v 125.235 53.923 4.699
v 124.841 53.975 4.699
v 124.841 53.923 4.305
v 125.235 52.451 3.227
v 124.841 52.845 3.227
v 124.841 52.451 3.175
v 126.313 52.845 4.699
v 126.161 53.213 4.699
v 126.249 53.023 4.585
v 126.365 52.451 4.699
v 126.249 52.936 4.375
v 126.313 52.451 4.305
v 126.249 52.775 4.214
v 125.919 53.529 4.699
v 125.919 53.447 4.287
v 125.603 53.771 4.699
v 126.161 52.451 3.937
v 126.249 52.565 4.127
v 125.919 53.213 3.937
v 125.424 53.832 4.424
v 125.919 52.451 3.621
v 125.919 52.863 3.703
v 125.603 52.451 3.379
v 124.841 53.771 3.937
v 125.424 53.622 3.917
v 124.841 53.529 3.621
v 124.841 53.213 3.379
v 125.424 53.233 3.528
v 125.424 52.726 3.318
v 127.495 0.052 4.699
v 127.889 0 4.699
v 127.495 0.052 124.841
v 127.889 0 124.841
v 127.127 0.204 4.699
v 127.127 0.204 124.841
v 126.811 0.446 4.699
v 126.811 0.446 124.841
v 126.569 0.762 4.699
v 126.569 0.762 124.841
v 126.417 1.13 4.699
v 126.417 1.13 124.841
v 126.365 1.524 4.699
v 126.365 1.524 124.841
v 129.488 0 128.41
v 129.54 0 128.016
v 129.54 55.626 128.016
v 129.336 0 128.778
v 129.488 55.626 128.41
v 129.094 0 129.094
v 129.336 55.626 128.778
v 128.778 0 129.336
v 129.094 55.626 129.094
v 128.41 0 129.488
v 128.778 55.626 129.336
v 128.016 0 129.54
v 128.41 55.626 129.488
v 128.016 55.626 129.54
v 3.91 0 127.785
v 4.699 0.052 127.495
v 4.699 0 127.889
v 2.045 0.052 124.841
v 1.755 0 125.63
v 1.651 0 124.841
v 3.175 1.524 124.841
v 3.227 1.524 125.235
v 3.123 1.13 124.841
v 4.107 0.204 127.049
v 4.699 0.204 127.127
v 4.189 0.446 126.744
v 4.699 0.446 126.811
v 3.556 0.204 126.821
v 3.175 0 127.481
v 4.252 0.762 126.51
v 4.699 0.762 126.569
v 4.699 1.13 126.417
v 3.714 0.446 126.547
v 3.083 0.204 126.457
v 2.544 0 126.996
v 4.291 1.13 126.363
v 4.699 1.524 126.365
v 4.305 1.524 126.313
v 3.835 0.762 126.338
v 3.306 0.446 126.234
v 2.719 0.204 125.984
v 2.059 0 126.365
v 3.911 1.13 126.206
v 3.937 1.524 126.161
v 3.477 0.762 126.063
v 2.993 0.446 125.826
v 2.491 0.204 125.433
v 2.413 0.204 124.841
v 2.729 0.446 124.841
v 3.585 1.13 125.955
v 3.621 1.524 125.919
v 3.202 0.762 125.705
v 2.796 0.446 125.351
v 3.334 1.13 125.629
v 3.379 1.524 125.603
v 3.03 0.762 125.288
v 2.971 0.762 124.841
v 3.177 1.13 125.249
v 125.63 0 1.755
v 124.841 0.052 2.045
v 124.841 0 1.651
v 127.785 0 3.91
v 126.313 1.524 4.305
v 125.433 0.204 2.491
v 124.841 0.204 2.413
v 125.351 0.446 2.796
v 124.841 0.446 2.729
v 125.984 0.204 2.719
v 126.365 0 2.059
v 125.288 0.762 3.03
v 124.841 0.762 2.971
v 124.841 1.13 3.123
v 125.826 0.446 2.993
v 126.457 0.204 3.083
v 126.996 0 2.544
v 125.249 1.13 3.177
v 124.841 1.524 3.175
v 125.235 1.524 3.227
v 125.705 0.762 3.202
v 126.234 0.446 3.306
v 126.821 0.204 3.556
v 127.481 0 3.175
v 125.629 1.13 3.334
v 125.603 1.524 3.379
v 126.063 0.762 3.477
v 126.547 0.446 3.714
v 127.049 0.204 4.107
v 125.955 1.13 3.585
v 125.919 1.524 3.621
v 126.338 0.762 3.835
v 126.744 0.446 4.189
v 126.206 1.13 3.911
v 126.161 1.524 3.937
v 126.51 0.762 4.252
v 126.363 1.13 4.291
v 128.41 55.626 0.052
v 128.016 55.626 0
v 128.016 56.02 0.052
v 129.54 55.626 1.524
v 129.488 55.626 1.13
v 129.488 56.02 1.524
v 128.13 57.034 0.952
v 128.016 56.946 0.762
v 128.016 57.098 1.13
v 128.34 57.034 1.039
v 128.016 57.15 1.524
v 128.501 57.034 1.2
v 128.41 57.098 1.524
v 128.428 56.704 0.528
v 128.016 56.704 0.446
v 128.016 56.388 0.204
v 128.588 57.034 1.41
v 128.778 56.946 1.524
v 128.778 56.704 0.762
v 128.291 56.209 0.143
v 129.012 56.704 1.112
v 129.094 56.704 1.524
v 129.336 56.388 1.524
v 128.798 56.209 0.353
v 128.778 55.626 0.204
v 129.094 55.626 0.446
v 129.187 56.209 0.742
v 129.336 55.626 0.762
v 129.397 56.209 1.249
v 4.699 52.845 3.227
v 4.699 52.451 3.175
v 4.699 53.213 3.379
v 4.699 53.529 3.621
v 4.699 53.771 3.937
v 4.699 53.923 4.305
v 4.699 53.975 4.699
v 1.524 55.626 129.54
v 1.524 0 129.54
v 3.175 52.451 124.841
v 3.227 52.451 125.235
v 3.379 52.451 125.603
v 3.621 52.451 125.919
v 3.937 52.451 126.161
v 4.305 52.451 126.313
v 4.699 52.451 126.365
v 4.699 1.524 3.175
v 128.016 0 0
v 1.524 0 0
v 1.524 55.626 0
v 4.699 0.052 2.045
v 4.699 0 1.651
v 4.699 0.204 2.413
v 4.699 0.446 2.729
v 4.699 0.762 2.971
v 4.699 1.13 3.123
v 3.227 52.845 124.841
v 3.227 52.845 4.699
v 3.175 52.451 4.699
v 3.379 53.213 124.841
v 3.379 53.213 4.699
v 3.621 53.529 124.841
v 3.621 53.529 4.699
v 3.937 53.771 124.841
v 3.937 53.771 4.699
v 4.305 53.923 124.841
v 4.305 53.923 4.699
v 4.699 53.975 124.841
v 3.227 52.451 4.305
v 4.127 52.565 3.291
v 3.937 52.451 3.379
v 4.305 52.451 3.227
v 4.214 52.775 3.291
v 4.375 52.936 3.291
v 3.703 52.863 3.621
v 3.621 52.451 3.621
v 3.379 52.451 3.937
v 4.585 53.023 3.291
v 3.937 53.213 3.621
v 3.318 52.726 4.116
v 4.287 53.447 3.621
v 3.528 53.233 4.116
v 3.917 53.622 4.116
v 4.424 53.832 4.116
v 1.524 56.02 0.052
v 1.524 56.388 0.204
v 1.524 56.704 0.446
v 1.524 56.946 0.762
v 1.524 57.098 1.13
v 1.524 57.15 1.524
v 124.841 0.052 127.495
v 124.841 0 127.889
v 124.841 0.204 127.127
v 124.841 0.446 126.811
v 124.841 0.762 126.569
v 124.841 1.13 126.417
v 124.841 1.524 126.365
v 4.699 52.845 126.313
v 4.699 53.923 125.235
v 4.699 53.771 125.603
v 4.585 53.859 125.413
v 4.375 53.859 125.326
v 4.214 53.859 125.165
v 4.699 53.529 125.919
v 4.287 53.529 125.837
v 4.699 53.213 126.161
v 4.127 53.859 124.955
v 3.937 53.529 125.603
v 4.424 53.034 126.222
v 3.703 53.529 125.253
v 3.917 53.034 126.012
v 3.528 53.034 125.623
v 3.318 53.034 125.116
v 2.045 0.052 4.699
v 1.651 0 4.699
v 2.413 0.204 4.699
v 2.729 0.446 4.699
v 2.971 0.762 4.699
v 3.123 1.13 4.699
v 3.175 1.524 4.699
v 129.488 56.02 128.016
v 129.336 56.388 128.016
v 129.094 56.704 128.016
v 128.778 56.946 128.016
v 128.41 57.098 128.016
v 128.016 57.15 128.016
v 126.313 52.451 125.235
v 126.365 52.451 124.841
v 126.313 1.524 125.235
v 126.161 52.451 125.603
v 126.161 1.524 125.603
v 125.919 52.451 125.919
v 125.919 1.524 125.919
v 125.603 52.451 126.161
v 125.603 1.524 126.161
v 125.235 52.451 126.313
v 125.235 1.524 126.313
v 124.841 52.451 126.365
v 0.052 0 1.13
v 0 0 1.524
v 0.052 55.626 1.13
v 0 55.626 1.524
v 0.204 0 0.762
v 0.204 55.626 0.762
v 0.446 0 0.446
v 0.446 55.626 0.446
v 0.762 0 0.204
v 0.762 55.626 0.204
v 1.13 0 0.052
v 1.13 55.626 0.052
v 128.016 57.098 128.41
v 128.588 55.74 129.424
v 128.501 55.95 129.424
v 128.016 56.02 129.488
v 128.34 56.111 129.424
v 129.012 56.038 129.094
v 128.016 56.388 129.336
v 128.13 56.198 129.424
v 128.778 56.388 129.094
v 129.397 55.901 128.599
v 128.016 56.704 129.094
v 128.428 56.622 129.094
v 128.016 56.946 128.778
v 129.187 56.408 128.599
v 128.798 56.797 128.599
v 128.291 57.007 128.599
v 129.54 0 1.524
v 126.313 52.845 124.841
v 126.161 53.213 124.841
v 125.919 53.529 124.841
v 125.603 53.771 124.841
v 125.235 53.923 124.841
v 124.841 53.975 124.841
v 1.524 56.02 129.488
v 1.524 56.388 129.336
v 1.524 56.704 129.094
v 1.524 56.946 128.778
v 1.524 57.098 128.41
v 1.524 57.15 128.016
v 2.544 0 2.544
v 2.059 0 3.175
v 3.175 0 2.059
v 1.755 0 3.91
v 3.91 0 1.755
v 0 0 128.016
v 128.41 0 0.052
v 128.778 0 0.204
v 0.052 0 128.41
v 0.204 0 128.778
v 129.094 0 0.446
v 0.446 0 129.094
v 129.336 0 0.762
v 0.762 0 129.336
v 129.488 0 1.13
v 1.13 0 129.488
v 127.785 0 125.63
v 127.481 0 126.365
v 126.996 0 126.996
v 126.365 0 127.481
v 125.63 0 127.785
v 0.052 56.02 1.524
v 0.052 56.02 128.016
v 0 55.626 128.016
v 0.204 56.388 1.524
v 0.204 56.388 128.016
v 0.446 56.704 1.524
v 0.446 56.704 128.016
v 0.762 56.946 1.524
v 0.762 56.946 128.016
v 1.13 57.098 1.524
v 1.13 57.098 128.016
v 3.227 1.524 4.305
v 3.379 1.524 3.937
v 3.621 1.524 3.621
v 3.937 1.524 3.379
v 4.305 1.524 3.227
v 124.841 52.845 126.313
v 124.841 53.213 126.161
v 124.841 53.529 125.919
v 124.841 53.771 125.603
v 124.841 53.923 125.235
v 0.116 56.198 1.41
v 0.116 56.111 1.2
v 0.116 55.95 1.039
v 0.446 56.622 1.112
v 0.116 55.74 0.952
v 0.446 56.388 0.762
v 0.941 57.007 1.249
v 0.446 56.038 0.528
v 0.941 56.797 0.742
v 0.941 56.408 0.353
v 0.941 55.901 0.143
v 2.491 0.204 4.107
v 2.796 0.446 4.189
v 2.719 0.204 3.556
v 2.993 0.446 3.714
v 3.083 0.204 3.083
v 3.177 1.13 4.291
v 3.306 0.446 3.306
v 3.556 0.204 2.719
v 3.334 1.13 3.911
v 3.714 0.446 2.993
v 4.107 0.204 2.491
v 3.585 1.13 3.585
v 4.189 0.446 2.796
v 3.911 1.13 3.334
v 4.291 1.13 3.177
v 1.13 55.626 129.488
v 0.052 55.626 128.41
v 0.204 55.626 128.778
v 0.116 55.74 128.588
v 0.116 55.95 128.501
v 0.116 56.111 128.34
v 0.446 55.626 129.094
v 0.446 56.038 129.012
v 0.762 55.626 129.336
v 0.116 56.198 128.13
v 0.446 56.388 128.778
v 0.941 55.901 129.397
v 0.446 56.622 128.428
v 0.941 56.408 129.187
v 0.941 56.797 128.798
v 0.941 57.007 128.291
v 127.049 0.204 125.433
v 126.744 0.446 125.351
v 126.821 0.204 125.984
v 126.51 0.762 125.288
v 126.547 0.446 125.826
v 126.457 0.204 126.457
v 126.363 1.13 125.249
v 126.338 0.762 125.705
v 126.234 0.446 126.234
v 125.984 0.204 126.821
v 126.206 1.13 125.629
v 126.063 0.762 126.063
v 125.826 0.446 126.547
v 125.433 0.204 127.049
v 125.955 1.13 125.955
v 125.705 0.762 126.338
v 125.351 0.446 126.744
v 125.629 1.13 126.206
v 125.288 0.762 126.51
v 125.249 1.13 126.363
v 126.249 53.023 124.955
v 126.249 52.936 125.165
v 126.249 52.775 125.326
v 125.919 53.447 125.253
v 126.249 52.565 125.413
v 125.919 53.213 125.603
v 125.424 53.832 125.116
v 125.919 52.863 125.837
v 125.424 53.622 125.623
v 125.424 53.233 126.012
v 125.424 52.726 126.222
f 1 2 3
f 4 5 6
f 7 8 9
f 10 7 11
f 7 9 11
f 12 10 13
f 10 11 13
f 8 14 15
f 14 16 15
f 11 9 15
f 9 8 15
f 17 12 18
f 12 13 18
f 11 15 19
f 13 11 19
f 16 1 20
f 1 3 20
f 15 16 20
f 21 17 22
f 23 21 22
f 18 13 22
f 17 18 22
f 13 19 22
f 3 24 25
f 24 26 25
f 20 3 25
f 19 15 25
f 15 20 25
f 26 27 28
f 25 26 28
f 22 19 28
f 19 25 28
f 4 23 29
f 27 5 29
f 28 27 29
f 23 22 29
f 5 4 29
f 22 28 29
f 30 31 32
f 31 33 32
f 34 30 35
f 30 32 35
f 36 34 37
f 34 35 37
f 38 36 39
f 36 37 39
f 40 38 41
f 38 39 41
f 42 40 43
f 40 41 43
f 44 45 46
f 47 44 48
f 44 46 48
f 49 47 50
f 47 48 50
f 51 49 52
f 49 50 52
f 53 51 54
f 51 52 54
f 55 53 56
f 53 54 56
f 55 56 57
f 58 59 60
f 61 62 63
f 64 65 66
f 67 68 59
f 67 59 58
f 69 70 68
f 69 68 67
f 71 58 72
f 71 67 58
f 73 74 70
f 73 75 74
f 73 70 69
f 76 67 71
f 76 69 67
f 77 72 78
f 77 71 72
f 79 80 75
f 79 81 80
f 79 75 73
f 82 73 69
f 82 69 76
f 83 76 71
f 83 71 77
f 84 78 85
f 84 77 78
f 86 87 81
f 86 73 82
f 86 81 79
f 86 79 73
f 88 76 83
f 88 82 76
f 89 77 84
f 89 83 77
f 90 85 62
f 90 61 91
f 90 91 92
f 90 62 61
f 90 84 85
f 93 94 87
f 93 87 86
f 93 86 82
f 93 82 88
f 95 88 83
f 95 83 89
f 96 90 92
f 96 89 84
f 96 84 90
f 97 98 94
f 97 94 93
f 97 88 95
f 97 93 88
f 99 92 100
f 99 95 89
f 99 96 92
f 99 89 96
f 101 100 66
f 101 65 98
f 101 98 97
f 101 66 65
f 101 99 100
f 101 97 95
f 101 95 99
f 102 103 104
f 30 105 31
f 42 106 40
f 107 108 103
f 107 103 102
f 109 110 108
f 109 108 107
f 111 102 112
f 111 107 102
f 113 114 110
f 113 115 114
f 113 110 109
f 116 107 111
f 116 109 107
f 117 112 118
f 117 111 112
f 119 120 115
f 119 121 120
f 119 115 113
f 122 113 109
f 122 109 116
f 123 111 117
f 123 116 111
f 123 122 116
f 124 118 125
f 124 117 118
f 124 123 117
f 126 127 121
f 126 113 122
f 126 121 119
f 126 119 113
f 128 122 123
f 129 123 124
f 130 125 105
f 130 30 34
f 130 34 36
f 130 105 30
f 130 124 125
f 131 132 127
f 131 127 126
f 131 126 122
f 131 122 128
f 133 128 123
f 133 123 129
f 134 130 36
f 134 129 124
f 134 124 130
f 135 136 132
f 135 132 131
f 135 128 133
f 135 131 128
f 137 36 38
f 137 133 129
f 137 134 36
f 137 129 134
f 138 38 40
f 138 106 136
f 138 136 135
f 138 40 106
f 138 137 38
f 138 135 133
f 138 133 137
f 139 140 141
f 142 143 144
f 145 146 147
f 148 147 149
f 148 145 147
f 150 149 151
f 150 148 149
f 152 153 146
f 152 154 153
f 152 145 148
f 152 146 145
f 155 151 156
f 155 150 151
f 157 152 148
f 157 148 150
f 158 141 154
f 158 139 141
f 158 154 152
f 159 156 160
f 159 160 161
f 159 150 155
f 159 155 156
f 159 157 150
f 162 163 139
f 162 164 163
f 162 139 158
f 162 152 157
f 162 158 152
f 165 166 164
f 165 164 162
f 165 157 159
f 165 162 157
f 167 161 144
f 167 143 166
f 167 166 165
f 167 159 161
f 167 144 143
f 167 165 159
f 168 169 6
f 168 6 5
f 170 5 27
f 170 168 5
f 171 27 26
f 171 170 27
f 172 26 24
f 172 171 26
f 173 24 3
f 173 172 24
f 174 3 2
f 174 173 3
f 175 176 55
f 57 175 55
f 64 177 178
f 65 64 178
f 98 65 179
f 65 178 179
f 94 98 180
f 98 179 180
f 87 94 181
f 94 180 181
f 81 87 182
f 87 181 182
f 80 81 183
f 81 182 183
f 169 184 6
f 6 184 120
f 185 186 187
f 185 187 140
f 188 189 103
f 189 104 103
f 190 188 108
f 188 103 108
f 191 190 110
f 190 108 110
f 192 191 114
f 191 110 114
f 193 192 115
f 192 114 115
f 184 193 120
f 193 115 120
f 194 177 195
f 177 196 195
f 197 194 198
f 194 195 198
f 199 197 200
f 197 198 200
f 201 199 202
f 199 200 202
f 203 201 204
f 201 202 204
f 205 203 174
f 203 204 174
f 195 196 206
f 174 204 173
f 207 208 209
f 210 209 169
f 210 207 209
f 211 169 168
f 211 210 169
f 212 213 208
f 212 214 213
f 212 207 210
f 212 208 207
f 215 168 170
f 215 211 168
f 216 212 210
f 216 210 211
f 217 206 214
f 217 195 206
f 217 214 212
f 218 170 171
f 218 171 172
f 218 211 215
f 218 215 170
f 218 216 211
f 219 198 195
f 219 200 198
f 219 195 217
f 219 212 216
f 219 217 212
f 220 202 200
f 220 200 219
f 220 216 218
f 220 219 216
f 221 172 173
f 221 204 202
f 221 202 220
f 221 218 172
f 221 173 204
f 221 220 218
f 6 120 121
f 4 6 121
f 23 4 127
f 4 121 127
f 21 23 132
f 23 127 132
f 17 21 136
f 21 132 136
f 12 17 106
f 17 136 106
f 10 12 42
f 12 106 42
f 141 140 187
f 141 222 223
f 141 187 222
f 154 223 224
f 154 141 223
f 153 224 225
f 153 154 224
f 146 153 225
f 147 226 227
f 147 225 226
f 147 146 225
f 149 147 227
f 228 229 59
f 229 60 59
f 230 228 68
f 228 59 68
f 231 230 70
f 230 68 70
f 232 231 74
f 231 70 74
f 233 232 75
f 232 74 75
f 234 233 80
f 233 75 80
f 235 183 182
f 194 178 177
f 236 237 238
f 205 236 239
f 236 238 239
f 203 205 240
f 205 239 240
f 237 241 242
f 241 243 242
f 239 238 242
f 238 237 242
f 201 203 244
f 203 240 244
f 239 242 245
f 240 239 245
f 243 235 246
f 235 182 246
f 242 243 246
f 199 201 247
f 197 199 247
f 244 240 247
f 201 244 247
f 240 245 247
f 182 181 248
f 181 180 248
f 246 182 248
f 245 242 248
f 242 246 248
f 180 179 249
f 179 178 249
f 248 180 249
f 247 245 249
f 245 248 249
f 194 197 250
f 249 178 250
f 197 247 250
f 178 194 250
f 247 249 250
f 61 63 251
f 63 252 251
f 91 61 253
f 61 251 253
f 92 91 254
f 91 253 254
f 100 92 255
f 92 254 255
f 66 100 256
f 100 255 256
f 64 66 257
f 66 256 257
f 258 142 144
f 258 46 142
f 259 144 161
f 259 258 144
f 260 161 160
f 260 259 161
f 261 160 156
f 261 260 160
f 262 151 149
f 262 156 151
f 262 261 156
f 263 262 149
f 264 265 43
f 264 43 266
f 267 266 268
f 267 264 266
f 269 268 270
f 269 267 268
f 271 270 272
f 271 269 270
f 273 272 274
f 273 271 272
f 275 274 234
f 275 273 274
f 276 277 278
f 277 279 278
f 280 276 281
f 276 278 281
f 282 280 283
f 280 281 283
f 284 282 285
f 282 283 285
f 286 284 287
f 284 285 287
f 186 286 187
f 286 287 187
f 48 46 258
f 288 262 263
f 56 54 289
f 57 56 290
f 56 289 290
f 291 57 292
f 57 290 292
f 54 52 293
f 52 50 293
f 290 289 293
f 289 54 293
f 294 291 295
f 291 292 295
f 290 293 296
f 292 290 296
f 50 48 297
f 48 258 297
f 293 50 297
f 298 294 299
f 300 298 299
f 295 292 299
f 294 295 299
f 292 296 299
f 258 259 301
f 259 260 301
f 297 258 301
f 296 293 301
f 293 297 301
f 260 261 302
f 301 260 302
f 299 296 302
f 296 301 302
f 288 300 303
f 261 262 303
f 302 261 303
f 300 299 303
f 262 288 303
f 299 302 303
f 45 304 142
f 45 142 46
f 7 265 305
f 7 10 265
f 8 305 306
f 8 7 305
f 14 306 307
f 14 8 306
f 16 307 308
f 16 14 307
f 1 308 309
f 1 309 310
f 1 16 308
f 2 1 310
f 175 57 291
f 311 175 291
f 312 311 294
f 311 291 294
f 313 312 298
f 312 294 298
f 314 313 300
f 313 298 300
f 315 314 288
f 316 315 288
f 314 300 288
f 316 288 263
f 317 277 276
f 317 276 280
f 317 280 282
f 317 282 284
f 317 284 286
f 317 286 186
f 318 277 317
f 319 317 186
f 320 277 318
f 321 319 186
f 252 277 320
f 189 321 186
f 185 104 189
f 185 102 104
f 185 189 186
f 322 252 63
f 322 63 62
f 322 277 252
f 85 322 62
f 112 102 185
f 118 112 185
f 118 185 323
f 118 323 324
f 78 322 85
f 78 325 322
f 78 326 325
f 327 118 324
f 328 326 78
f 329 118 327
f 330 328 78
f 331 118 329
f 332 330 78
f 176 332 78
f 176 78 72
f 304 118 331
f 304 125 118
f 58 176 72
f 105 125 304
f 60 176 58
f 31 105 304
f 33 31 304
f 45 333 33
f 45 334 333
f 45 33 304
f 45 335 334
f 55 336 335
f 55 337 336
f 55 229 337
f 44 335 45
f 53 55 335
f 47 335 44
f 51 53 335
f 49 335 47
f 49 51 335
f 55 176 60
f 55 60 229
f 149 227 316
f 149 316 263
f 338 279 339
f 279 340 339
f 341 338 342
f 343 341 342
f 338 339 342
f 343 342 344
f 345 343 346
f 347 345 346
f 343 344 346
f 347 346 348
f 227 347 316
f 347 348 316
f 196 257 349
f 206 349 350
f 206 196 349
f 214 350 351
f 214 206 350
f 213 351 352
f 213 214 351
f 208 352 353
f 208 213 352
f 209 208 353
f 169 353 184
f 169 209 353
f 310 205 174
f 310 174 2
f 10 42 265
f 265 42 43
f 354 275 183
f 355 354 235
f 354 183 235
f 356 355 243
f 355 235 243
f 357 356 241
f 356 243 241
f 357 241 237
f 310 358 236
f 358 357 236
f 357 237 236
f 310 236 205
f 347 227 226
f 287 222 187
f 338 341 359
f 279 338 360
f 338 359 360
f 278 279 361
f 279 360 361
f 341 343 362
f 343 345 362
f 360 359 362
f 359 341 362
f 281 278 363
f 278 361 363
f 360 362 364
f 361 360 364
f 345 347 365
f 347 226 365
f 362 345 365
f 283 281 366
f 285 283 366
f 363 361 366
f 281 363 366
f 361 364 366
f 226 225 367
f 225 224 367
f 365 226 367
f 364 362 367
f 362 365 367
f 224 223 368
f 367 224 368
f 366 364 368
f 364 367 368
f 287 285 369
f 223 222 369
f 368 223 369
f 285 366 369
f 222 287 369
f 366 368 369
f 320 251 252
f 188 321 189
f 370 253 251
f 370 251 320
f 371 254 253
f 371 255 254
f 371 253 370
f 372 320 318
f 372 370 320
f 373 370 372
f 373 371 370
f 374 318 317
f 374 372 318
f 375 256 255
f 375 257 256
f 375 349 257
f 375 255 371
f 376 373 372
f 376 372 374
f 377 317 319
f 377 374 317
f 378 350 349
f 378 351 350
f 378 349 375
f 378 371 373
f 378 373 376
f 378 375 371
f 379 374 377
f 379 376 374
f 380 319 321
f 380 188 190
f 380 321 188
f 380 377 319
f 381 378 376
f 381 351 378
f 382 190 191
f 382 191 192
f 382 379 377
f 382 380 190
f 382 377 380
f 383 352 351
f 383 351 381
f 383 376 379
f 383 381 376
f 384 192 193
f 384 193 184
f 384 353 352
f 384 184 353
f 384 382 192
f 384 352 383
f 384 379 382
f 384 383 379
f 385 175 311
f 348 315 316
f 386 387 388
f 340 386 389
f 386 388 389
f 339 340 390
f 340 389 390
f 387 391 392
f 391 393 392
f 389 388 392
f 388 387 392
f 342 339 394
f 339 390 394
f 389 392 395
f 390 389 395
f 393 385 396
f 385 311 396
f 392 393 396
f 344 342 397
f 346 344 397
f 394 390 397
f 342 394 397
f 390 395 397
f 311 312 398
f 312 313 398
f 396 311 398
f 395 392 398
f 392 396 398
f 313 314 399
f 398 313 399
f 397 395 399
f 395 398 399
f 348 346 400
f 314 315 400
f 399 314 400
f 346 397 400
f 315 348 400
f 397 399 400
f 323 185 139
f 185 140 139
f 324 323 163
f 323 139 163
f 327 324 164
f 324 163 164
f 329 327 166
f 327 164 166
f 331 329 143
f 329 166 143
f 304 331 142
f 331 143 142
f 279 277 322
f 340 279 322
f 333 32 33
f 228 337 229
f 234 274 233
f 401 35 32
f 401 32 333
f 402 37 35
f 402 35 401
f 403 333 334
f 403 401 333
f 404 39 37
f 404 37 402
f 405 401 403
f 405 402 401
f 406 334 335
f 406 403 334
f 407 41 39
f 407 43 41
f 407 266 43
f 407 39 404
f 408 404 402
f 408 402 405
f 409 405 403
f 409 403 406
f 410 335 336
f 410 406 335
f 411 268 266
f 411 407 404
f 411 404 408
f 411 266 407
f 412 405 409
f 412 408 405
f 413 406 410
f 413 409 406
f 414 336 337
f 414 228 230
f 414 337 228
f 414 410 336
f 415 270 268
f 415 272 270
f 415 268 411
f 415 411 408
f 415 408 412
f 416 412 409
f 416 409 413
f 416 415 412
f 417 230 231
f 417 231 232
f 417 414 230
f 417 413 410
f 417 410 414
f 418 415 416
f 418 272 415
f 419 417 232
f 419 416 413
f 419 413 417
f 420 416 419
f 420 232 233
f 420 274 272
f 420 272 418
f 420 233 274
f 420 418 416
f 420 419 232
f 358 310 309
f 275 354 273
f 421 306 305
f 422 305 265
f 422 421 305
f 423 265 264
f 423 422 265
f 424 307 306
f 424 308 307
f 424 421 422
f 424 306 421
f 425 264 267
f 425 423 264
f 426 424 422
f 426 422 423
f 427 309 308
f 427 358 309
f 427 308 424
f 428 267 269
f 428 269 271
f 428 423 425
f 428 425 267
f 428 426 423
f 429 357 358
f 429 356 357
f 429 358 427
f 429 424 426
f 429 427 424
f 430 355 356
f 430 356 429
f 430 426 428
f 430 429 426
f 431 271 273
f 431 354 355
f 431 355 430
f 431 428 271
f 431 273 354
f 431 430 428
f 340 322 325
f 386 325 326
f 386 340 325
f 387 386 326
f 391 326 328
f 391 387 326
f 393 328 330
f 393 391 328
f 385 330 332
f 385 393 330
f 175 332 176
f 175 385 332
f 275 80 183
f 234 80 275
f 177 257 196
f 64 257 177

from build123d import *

# Parameters (mm, degrees)
F0_W     = 129.54
F0_H     = 129.54
F1_DEPTH = 57.15
F2_T     = -3.175
F3_R     = 1.524
F4_R     = 1.524
F5_R     = 1.524


with BuildPart() as f1:
    # F0 (on Front) → F1 (new body)
    with BuildSketch(Plane.XZ):
        with Locations((64.77, 64.77)):
            Rectangle(F0_W, F0_H)
    extrude(amount=-F1_DEPTH)

    # F2
    f2_openings = [f1.faces().sort_by_distance(p)[0] for p in [
        (64.77, 0, 64.77),
    ]]
    offset(amount=F2_T, openings=f2_openings)

    # F3
    f3_edges = [f1.edges().sort_by_distance(p)[0] for p in [
        (3.175, 26.9875, 126.365),
        (64.77, 53.975, 126.365),
        (3.175, 53.975, 64.77),
        (3.175, 26.9875, 3.175),
        (64.77, 53.975, 3.175),
        (126.365, 53.975, 64.77),
        (126.365, 26.9875, 126.365),
        (126.365, 26.9875, 3.175),
    ]]
    fillet(f3_edges, radius=F3_R)

    # F4
    f4_edges = [f1.edges().sort_by_distance(p)[0] for p in [
        (129.54, 28.575, 0),
        (64.77, 57.15, 0),
        (129.54, 57.15, 64.77),
        (129.54, 28.575, 129.54),
        (64.77, 57.15, 129.54),
        (0, 28.575, 129.54),
        (0, 57.15, 64.77),
        (0, 28.575, 0),
    ]]
    fillet(f4_edges, radius=F4_R)

    # F5
    f5_edges = [f1.edges().sort_by_distance(p)[0] for p in [
        (64.77, 0, 3.175),
    ]]
    fillet(f5_edges, radius=F5_R)


solid = f1.part
